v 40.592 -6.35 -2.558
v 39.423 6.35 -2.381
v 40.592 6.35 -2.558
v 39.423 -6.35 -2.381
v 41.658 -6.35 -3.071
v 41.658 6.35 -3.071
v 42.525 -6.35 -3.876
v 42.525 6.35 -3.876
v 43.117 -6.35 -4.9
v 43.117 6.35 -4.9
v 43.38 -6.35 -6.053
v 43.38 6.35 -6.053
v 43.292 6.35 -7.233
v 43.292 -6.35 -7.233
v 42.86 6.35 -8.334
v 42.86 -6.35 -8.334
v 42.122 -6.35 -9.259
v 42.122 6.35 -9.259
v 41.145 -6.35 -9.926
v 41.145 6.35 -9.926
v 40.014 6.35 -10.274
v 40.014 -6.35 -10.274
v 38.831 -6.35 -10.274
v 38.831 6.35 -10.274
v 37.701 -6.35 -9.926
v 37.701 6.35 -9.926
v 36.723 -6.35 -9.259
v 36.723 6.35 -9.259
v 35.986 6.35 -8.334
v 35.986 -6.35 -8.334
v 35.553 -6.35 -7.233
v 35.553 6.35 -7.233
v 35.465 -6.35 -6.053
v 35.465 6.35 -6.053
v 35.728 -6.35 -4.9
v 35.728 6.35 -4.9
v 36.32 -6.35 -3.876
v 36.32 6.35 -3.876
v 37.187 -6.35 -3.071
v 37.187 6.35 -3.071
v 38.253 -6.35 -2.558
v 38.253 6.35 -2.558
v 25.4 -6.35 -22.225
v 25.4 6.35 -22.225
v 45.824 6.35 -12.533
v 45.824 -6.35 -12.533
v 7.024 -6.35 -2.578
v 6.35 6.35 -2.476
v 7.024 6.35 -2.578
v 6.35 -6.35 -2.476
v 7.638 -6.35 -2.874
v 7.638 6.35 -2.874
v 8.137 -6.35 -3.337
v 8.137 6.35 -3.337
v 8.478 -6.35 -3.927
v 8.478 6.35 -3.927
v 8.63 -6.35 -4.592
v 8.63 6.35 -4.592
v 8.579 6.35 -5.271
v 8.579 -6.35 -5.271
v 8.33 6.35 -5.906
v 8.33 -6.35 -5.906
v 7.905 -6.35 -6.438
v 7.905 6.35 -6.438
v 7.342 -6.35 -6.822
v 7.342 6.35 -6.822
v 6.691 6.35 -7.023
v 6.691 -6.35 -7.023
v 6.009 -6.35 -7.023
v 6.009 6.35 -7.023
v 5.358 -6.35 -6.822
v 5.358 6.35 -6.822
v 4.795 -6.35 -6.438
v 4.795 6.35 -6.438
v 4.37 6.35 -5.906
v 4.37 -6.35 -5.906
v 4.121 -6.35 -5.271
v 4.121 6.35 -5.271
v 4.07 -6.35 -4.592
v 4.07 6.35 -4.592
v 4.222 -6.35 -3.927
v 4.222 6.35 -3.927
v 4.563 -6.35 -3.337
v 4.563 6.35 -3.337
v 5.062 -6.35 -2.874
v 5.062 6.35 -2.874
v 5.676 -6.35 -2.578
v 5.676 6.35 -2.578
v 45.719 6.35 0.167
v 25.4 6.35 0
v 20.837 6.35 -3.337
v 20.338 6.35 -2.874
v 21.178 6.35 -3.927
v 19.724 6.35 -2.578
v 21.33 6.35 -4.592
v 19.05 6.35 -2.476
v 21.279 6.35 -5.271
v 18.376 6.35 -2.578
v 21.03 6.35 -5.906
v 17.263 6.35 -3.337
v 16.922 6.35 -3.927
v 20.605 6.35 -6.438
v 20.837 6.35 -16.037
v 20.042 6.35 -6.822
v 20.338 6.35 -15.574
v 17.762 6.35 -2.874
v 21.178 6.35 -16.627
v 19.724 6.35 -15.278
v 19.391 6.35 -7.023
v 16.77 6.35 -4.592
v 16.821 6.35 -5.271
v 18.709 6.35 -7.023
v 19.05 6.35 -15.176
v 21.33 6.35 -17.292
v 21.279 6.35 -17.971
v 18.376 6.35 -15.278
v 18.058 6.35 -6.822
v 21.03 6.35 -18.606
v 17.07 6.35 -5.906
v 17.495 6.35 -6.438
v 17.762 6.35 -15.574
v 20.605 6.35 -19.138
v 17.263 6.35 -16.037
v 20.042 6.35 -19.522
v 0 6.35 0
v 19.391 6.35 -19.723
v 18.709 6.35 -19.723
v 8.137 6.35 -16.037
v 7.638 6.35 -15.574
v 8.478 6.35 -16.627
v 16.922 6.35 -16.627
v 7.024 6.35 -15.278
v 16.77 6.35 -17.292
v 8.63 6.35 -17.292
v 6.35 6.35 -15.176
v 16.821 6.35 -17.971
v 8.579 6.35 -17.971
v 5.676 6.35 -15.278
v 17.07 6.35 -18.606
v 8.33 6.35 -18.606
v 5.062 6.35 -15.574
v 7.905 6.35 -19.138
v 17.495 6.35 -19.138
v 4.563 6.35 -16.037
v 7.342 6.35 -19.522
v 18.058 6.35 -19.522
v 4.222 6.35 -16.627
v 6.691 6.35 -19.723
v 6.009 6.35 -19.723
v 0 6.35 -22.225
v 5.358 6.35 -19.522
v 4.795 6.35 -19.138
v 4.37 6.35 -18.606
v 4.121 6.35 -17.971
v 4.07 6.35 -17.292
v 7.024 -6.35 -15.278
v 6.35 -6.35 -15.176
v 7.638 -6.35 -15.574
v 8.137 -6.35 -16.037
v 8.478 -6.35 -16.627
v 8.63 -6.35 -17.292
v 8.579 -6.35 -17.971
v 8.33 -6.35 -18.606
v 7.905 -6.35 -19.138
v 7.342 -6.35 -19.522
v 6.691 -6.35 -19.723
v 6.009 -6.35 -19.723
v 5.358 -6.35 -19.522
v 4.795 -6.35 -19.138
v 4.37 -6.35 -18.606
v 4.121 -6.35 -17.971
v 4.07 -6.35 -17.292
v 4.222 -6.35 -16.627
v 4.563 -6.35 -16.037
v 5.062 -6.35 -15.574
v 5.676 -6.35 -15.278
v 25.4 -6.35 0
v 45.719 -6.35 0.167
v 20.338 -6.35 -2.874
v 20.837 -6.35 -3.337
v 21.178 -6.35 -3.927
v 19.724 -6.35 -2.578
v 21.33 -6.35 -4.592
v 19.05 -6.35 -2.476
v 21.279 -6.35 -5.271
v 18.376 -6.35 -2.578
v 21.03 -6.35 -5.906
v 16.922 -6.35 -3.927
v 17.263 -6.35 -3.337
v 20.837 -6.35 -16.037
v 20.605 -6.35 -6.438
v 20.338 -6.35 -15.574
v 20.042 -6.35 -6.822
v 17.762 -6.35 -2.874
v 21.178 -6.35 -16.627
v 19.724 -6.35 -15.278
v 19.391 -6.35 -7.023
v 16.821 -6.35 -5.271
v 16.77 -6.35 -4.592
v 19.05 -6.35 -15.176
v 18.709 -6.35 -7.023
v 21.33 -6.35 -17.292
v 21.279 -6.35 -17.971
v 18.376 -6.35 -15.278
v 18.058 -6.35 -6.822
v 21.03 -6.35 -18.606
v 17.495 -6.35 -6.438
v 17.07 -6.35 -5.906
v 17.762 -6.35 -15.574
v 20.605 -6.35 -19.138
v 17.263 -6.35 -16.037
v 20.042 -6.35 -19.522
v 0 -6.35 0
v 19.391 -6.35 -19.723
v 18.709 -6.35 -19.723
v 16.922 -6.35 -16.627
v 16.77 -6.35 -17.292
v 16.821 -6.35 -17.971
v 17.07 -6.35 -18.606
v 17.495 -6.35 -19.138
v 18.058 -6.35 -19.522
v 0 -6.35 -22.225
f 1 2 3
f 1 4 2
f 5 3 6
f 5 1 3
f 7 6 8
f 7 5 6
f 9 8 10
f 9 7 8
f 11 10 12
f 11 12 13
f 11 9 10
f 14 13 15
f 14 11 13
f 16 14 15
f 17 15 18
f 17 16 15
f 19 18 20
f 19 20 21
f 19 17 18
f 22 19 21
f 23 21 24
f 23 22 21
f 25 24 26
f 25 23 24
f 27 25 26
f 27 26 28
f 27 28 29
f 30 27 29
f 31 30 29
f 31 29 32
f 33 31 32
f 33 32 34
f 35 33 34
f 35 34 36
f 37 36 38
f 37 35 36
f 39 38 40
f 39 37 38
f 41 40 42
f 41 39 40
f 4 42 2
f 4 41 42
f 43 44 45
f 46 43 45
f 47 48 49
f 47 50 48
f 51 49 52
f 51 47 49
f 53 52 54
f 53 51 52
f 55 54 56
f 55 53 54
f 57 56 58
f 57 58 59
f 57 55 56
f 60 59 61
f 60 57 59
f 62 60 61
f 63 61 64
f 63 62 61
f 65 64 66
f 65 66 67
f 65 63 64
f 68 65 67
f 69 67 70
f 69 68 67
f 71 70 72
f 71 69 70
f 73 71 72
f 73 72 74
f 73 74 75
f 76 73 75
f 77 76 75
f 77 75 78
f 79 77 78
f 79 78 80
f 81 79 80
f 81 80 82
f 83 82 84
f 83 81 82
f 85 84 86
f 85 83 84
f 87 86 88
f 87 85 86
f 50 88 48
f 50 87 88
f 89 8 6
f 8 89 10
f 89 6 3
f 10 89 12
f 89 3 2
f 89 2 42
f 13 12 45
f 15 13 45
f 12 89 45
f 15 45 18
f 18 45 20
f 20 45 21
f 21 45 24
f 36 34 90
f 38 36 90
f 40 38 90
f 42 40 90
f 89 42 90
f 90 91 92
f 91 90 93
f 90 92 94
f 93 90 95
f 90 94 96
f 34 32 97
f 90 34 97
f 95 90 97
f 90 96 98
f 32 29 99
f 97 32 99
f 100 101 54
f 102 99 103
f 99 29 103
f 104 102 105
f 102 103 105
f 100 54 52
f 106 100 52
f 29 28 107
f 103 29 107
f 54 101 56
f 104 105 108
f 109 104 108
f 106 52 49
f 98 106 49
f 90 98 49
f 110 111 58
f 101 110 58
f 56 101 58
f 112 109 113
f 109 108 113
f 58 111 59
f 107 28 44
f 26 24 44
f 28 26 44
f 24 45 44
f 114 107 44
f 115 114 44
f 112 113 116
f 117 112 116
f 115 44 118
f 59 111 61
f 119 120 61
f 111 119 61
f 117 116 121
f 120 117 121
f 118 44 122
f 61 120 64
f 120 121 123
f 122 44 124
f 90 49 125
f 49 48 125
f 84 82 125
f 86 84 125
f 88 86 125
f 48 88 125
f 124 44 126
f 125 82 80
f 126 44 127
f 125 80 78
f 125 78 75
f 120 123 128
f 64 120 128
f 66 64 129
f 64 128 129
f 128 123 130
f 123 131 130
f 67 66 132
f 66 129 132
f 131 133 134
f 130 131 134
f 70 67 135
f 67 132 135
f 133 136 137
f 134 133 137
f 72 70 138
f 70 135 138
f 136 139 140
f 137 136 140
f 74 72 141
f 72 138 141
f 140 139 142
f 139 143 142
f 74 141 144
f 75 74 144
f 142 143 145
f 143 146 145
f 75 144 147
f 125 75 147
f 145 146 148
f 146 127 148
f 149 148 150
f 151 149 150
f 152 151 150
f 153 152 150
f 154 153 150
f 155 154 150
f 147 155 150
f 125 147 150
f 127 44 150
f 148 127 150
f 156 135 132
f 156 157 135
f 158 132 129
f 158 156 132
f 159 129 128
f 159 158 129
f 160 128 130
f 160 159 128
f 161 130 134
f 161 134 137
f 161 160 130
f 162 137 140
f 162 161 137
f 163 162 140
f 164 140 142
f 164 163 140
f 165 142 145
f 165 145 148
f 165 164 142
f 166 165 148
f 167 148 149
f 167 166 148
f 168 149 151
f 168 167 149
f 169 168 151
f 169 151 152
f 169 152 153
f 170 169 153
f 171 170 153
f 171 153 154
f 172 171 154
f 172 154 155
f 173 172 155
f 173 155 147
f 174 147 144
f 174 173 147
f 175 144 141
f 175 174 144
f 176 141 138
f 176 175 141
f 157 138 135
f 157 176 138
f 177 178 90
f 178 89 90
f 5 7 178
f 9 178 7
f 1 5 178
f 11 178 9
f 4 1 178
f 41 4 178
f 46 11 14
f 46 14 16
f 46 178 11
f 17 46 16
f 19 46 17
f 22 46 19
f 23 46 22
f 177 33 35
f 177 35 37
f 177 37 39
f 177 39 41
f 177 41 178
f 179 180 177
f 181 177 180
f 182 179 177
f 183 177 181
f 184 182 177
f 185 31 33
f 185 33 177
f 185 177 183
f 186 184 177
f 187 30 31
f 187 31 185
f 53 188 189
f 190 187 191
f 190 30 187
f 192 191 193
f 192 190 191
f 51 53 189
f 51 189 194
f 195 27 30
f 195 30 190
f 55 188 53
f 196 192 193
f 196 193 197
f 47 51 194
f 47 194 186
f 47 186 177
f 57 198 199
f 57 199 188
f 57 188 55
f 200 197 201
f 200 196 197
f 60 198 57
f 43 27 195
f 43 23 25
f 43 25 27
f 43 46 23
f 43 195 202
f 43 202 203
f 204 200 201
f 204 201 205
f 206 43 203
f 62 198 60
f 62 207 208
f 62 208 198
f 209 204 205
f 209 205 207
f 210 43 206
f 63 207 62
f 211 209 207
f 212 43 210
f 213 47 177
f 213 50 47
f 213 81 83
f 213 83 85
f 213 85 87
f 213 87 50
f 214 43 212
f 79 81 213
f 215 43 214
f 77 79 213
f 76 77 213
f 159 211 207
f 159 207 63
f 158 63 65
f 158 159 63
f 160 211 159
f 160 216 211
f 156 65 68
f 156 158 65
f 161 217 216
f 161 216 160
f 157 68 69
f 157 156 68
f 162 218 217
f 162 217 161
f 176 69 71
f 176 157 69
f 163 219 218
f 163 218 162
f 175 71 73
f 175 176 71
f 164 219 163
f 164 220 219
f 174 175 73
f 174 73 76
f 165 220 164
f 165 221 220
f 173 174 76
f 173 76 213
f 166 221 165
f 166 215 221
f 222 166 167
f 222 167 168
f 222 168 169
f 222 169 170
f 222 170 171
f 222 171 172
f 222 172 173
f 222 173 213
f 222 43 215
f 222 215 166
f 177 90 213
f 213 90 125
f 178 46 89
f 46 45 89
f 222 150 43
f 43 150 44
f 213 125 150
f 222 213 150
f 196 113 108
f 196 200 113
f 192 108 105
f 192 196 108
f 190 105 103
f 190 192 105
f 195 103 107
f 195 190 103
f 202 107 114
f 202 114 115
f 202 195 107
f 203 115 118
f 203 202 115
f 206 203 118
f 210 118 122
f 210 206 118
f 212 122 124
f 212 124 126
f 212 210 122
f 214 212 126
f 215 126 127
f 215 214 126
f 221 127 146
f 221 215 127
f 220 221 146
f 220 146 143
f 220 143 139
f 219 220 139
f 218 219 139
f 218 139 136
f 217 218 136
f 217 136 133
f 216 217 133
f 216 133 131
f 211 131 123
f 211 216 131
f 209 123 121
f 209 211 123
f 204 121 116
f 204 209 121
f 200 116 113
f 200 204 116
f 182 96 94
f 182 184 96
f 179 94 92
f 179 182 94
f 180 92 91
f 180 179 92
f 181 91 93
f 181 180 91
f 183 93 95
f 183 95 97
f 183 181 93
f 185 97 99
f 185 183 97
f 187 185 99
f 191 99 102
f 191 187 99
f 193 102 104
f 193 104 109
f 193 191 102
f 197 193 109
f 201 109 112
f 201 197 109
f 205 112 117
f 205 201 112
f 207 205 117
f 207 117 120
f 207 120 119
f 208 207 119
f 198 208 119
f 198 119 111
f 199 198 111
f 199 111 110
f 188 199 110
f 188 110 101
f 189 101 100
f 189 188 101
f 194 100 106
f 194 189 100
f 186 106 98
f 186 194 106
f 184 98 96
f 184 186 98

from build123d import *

# Parameters (mm, degrees)
SKETCH1_R           = 3.96875
SKETCH1_R_2         = 2.286
BOSS_EXTRUDE1_DEPTH = 6.35


with BuildPart() as part:
    # Sketch1 → Boss-Extrude1 (new, symmetric)
    with BuildSketch(Plane(origin=(0, 0, 0), x_dir=(1, 0, 0), z_dir=(0, 1, 0))):
        Polygon((25.4, 22.225), (45.823533094, 12.53282474), (45.719315816, -0.166747645), (25.4, 0), (0, 0), (0, 22.225), align=None)
        with Locations(Location((39.422580786, 6.35, 0), (0, 0, 270))):
            Circle(SKETCH1_R, mode=Mode.SUBTRACT)
        with Locations(Location((6.35, 4.7625, 0), (0, 0, 270))):
            Circle(SKETCH1_R_2, mode=Mode.SUBTRACT)
        with Locations(Location((19.05, 4.7625, 0), (0, 0, 270))):
            Circle(SKETCH1_R_2, mode=Mode.SUBTRACT)
        with Locations(Location((19.05, 17.4625, 0), (0, 0, 270))):
            Circle(SKETCH1_R_2, mode=Mode.SUBTRACT)
        with Locations(Location((6.35, 17.4625, 0), (0, 0, 270))):
            Circle(SKETCH1_R_2, mode=Mode.SUBTRACT)
    extrude(amount=BOSS_EXTRUDE1_DEPTH, both=True)


solid = part.part
